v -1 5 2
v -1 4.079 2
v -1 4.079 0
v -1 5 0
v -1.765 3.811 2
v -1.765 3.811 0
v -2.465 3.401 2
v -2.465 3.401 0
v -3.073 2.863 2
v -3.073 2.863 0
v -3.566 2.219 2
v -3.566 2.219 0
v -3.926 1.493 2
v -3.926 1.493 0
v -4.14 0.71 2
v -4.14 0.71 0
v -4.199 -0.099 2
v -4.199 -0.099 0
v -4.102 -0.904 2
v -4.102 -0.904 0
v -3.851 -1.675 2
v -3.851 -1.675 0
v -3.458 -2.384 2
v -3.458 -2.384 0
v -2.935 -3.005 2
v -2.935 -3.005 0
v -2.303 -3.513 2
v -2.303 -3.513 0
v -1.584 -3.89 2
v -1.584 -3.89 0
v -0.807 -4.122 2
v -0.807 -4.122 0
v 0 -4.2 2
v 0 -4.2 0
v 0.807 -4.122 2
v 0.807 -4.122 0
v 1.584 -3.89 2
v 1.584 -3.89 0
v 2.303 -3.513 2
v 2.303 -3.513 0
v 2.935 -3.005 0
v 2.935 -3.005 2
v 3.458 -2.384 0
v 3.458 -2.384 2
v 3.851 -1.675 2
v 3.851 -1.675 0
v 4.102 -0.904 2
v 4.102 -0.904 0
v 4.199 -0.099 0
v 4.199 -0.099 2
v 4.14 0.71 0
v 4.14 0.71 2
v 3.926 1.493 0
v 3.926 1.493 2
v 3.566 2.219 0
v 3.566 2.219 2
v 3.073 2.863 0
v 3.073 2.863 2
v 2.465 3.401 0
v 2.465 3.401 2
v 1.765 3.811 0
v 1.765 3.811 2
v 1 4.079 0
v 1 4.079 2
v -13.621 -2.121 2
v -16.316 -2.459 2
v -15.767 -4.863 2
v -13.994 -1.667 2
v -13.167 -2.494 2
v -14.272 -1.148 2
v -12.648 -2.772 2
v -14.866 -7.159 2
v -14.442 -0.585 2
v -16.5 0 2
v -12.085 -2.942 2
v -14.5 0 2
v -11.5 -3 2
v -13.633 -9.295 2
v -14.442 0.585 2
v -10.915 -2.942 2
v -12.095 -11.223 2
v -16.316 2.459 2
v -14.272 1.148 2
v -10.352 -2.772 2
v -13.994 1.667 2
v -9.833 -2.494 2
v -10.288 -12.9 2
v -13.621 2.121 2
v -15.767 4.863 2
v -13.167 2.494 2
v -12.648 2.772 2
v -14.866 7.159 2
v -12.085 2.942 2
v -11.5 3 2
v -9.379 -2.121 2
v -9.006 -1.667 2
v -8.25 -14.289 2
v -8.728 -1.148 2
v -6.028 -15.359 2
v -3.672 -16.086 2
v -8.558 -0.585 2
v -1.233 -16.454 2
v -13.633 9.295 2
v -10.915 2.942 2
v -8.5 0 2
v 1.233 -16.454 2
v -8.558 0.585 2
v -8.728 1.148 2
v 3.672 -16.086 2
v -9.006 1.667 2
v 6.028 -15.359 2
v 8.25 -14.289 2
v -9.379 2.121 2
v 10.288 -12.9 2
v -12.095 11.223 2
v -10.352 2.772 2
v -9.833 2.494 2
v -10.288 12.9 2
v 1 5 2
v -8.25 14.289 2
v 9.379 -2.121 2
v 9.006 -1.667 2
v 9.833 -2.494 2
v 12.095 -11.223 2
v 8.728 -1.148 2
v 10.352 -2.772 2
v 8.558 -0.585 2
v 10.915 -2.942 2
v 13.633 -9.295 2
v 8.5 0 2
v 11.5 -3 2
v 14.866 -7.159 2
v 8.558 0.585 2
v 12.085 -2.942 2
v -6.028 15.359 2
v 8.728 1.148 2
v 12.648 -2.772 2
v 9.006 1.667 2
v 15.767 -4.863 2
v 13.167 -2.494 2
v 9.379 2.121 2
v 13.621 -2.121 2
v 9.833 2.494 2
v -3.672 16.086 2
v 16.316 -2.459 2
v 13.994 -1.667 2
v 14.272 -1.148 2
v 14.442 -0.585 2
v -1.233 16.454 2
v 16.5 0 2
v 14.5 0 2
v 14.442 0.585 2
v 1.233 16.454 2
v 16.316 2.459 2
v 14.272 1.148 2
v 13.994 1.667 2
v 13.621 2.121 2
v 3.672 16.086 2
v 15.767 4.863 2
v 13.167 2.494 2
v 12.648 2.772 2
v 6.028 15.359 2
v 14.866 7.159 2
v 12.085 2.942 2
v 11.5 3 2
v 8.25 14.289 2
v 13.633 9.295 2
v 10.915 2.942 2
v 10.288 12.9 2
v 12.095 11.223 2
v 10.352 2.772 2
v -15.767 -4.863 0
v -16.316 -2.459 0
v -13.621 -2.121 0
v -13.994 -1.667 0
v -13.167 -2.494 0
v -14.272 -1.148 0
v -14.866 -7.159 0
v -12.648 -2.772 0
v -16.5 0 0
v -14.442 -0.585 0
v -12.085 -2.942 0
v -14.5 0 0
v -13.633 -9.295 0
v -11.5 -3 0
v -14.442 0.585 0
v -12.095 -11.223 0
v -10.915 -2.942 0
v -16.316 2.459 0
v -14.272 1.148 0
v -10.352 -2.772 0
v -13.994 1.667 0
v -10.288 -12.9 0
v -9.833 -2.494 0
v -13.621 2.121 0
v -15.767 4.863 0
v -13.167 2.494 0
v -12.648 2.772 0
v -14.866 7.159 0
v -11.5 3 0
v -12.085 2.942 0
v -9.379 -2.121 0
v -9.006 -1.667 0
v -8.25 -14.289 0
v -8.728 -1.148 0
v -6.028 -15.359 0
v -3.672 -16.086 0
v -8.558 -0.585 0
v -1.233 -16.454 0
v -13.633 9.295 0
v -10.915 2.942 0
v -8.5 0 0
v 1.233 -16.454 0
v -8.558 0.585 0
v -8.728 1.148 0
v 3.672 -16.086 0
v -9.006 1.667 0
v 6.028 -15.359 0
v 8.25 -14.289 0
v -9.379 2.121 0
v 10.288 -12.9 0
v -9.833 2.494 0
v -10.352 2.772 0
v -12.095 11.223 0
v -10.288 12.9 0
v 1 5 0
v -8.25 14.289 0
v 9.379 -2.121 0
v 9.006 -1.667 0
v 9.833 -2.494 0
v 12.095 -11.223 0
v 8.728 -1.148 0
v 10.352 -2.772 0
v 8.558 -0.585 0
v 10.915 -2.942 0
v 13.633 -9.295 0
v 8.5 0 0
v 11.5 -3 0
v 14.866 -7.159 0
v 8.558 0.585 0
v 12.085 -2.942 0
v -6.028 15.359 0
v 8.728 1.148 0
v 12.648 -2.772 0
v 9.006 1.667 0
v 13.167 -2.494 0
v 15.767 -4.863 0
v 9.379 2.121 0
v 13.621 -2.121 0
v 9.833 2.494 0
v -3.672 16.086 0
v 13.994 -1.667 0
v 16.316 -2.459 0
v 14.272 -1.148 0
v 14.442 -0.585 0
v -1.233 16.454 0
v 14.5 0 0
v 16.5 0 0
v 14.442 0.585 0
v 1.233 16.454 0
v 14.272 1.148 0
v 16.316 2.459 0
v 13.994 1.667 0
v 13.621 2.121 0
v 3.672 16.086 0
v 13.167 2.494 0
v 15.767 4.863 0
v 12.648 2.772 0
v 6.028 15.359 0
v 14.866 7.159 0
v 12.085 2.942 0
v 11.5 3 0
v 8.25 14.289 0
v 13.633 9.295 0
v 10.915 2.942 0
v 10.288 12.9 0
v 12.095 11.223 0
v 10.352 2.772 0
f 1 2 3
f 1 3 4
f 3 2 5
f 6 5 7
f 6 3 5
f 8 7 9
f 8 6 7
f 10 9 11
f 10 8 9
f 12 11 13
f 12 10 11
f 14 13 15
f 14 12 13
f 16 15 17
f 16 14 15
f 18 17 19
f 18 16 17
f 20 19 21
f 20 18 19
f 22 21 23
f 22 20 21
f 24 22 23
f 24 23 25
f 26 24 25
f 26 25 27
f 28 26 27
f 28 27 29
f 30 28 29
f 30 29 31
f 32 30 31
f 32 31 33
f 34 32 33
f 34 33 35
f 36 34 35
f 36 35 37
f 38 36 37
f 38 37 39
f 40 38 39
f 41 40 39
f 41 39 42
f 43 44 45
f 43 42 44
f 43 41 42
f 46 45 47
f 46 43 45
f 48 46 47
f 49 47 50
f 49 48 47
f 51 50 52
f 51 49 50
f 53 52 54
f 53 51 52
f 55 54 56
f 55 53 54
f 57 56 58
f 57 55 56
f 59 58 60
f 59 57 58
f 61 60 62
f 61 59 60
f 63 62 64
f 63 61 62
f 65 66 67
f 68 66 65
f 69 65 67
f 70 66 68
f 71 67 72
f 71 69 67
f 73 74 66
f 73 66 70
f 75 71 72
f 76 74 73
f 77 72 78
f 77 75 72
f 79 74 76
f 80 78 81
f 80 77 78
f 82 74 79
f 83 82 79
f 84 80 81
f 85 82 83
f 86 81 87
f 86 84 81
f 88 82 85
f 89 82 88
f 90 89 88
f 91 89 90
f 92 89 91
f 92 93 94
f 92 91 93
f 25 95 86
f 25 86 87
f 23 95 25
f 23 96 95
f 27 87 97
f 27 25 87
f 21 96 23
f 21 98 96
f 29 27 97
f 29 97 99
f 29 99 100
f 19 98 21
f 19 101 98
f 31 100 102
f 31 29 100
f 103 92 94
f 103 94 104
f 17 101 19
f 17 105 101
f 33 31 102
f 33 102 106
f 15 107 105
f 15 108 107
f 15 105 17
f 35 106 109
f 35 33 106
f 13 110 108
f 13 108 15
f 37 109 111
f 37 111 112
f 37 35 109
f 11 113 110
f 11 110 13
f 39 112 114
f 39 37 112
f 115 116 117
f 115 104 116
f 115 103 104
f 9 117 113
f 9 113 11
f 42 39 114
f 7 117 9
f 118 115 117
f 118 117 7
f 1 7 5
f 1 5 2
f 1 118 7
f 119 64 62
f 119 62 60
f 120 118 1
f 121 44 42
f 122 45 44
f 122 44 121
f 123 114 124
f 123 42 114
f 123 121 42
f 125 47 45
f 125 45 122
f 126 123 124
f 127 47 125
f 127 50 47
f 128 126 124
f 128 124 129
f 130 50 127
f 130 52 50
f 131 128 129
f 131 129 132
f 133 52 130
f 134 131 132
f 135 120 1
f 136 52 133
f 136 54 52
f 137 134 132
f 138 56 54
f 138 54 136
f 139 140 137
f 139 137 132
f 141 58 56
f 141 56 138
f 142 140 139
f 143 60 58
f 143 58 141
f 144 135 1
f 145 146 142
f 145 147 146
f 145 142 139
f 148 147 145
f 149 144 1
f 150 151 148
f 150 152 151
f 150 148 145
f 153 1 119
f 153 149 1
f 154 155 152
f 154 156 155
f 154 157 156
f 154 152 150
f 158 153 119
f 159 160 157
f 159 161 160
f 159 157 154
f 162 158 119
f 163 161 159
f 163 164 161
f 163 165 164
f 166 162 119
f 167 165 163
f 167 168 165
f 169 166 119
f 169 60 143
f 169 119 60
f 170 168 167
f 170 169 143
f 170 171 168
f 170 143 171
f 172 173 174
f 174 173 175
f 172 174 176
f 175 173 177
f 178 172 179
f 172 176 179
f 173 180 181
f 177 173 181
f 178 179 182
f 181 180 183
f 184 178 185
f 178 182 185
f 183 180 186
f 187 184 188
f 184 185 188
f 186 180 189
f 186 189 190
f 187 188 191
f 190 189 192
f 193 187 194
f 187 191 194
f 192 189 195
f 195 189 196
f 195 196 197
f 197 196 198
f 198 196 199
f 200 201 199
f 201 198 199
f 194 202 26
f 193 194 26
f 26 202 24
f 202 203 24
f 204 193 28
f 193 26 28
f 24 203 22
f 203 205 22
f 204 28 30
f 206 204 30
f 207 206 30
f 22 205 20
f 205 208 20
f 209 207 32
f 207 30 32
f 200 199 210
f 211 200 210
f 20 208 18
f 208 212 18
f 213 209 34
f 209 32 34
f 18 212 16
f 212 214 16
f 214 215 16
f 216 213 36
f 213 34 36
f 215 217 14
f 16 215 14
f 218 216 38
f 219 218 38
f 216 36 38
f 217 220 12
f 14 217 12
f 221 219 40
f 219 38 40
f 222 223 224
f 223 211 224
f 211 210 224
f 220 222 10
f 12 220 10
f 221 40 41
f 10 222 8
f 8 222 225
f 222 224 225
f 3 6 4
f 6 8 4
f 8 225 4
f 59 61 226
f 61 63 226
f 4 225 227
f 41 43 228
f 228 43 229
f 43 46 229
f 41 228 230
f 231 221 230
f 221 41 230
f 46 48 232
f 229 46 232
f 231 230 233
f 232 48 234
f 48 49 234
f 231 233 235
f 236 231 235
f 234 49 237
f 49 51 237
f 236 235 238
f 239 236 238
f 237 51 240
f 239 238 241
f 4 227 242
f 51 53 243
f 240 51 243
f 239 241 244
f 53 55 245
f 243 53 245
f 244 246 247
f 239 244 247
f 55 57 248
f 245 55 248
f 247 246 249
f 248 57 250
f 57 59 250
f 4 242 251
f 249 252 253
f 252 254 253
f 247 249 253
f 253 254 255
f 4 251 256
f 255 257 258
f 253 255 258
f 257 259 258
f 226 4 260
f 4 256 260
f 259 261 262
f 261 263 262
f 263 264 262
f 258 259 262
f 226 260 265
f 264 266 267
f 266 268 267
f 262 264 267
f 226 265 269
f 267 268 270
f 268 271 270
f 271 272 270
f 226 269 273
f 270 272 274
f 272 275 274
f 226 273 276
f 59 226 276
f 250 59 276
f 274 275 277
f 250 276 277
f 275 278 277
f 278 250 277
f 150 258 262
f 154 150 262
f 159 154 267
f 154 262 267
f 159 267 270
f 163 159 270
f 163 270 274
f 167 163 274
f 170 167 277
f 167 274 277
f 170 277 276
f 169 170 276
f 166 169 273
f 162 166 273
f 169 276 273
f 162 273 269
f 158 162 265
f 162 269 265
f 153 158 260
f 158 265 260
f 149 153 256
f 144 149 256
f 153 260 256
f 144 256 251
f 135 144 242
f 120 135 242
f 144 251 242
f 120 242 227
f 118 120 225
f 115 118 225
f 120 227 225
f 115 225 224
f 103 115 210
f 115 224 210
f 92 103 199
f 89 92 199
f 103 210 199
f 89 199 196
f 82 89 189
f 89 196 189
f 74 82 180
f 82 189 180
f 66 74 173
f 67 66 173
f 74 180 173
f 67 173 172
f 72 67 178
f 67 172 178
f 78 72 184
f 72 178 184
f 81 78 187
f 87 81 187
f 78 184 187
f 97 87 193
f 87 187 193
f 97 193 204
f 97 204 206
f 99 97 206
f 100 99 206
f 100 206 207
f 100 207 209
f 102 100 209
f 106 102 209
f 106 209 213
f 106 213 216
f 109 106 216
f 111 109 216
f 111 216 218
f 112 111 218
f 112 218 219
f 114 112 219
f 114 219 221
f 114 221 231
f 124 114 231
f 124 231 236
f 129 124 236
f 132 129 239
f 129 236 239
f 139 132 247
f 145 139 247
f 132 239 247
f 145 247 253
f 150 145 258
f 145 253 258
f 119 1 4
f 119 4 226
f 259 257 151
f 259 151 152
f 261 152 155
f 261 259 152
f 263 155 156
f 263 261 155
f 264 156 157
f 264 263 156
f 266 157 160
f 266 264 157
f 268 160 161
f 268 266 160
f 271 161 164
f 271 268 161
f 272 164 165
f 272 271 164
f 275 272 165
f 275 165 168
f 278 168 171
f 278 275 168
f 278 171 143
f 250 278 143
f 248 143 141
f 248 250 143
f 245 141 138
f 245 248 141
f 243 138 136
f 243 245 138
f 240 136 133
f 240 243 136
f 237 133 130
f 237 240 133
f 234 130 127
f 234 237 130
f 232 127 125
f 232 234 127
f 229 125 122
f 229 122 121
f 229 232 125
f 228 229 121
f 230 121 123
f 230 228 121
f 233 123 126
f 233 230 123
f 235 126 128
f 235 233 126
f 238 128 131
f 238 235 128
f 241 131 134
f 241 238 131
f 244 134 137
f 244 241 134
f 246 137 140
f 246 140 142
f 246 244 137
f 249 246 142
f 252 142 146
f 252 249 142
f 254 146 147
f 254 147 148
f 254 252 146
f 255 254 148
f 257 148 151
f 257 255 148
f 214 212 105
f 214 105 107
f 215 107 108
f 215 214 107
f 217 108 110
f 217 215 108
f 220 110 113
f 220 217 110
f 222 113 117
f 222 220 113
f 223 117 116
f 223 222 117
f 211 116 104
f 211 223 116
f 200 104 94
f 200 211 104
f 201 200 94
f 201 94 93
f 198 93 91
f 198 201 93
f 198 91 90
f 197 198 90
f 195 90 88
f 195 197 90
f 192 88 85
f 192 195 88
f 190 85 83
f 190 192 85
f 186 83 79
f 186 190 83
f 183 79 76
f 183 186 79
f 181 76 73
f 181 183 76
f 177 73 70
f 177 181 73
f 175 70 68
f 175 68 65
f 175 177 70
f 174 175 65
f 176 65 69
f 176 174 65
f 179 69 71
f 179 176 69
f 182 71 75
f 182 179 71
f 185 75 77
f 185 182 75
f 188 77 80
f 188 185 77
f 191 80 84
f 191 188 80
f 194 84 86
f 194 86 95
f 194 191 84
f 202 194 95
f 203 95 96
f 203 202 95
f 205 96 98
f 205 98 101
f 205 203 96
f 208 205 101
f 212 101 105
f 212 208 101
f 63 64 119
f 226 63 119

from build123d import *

# Parameters (mm, degrees)
SKETCH_R     = 16.5
SKETCH_R_2   = 3
SKETCH_R_3   = 4.2
PAD_DEPTH    = 2
SKETCH001_W  = 2
SKETCH001_H  = 2
POCKET_DEPTH = 2.001


with BuildPart() as part:
    # Sketch → Pad (new body)
    with BuildSketch(Plane.XY):
        Circle(SKETCH_R)
        with Locations((-11.5, 0)):
            Circle(SKETCH_R_2, mode=Mode.SUBTRACT)
        with Locations((11.5, 0)):
            Circle(SKETCH_R_2, mode=Mode.SUBTRACT)
        Circle(SKETCH_R_3, mode=Mode.SUBTRACT)
    extrude(amount=PAD_DEPTH)

    # Sketch001 → Pocket (cut, through all)
    with BuildSketch(Plane.XY.offset(2)):
        with Locations((0, 4)):
            Rectangle(SKETCH001_W, SKETCH001_H)
    extrude(amount=-POCKET_DEPTH, mode=Mode.SUBTRACT)


solid = part.part
